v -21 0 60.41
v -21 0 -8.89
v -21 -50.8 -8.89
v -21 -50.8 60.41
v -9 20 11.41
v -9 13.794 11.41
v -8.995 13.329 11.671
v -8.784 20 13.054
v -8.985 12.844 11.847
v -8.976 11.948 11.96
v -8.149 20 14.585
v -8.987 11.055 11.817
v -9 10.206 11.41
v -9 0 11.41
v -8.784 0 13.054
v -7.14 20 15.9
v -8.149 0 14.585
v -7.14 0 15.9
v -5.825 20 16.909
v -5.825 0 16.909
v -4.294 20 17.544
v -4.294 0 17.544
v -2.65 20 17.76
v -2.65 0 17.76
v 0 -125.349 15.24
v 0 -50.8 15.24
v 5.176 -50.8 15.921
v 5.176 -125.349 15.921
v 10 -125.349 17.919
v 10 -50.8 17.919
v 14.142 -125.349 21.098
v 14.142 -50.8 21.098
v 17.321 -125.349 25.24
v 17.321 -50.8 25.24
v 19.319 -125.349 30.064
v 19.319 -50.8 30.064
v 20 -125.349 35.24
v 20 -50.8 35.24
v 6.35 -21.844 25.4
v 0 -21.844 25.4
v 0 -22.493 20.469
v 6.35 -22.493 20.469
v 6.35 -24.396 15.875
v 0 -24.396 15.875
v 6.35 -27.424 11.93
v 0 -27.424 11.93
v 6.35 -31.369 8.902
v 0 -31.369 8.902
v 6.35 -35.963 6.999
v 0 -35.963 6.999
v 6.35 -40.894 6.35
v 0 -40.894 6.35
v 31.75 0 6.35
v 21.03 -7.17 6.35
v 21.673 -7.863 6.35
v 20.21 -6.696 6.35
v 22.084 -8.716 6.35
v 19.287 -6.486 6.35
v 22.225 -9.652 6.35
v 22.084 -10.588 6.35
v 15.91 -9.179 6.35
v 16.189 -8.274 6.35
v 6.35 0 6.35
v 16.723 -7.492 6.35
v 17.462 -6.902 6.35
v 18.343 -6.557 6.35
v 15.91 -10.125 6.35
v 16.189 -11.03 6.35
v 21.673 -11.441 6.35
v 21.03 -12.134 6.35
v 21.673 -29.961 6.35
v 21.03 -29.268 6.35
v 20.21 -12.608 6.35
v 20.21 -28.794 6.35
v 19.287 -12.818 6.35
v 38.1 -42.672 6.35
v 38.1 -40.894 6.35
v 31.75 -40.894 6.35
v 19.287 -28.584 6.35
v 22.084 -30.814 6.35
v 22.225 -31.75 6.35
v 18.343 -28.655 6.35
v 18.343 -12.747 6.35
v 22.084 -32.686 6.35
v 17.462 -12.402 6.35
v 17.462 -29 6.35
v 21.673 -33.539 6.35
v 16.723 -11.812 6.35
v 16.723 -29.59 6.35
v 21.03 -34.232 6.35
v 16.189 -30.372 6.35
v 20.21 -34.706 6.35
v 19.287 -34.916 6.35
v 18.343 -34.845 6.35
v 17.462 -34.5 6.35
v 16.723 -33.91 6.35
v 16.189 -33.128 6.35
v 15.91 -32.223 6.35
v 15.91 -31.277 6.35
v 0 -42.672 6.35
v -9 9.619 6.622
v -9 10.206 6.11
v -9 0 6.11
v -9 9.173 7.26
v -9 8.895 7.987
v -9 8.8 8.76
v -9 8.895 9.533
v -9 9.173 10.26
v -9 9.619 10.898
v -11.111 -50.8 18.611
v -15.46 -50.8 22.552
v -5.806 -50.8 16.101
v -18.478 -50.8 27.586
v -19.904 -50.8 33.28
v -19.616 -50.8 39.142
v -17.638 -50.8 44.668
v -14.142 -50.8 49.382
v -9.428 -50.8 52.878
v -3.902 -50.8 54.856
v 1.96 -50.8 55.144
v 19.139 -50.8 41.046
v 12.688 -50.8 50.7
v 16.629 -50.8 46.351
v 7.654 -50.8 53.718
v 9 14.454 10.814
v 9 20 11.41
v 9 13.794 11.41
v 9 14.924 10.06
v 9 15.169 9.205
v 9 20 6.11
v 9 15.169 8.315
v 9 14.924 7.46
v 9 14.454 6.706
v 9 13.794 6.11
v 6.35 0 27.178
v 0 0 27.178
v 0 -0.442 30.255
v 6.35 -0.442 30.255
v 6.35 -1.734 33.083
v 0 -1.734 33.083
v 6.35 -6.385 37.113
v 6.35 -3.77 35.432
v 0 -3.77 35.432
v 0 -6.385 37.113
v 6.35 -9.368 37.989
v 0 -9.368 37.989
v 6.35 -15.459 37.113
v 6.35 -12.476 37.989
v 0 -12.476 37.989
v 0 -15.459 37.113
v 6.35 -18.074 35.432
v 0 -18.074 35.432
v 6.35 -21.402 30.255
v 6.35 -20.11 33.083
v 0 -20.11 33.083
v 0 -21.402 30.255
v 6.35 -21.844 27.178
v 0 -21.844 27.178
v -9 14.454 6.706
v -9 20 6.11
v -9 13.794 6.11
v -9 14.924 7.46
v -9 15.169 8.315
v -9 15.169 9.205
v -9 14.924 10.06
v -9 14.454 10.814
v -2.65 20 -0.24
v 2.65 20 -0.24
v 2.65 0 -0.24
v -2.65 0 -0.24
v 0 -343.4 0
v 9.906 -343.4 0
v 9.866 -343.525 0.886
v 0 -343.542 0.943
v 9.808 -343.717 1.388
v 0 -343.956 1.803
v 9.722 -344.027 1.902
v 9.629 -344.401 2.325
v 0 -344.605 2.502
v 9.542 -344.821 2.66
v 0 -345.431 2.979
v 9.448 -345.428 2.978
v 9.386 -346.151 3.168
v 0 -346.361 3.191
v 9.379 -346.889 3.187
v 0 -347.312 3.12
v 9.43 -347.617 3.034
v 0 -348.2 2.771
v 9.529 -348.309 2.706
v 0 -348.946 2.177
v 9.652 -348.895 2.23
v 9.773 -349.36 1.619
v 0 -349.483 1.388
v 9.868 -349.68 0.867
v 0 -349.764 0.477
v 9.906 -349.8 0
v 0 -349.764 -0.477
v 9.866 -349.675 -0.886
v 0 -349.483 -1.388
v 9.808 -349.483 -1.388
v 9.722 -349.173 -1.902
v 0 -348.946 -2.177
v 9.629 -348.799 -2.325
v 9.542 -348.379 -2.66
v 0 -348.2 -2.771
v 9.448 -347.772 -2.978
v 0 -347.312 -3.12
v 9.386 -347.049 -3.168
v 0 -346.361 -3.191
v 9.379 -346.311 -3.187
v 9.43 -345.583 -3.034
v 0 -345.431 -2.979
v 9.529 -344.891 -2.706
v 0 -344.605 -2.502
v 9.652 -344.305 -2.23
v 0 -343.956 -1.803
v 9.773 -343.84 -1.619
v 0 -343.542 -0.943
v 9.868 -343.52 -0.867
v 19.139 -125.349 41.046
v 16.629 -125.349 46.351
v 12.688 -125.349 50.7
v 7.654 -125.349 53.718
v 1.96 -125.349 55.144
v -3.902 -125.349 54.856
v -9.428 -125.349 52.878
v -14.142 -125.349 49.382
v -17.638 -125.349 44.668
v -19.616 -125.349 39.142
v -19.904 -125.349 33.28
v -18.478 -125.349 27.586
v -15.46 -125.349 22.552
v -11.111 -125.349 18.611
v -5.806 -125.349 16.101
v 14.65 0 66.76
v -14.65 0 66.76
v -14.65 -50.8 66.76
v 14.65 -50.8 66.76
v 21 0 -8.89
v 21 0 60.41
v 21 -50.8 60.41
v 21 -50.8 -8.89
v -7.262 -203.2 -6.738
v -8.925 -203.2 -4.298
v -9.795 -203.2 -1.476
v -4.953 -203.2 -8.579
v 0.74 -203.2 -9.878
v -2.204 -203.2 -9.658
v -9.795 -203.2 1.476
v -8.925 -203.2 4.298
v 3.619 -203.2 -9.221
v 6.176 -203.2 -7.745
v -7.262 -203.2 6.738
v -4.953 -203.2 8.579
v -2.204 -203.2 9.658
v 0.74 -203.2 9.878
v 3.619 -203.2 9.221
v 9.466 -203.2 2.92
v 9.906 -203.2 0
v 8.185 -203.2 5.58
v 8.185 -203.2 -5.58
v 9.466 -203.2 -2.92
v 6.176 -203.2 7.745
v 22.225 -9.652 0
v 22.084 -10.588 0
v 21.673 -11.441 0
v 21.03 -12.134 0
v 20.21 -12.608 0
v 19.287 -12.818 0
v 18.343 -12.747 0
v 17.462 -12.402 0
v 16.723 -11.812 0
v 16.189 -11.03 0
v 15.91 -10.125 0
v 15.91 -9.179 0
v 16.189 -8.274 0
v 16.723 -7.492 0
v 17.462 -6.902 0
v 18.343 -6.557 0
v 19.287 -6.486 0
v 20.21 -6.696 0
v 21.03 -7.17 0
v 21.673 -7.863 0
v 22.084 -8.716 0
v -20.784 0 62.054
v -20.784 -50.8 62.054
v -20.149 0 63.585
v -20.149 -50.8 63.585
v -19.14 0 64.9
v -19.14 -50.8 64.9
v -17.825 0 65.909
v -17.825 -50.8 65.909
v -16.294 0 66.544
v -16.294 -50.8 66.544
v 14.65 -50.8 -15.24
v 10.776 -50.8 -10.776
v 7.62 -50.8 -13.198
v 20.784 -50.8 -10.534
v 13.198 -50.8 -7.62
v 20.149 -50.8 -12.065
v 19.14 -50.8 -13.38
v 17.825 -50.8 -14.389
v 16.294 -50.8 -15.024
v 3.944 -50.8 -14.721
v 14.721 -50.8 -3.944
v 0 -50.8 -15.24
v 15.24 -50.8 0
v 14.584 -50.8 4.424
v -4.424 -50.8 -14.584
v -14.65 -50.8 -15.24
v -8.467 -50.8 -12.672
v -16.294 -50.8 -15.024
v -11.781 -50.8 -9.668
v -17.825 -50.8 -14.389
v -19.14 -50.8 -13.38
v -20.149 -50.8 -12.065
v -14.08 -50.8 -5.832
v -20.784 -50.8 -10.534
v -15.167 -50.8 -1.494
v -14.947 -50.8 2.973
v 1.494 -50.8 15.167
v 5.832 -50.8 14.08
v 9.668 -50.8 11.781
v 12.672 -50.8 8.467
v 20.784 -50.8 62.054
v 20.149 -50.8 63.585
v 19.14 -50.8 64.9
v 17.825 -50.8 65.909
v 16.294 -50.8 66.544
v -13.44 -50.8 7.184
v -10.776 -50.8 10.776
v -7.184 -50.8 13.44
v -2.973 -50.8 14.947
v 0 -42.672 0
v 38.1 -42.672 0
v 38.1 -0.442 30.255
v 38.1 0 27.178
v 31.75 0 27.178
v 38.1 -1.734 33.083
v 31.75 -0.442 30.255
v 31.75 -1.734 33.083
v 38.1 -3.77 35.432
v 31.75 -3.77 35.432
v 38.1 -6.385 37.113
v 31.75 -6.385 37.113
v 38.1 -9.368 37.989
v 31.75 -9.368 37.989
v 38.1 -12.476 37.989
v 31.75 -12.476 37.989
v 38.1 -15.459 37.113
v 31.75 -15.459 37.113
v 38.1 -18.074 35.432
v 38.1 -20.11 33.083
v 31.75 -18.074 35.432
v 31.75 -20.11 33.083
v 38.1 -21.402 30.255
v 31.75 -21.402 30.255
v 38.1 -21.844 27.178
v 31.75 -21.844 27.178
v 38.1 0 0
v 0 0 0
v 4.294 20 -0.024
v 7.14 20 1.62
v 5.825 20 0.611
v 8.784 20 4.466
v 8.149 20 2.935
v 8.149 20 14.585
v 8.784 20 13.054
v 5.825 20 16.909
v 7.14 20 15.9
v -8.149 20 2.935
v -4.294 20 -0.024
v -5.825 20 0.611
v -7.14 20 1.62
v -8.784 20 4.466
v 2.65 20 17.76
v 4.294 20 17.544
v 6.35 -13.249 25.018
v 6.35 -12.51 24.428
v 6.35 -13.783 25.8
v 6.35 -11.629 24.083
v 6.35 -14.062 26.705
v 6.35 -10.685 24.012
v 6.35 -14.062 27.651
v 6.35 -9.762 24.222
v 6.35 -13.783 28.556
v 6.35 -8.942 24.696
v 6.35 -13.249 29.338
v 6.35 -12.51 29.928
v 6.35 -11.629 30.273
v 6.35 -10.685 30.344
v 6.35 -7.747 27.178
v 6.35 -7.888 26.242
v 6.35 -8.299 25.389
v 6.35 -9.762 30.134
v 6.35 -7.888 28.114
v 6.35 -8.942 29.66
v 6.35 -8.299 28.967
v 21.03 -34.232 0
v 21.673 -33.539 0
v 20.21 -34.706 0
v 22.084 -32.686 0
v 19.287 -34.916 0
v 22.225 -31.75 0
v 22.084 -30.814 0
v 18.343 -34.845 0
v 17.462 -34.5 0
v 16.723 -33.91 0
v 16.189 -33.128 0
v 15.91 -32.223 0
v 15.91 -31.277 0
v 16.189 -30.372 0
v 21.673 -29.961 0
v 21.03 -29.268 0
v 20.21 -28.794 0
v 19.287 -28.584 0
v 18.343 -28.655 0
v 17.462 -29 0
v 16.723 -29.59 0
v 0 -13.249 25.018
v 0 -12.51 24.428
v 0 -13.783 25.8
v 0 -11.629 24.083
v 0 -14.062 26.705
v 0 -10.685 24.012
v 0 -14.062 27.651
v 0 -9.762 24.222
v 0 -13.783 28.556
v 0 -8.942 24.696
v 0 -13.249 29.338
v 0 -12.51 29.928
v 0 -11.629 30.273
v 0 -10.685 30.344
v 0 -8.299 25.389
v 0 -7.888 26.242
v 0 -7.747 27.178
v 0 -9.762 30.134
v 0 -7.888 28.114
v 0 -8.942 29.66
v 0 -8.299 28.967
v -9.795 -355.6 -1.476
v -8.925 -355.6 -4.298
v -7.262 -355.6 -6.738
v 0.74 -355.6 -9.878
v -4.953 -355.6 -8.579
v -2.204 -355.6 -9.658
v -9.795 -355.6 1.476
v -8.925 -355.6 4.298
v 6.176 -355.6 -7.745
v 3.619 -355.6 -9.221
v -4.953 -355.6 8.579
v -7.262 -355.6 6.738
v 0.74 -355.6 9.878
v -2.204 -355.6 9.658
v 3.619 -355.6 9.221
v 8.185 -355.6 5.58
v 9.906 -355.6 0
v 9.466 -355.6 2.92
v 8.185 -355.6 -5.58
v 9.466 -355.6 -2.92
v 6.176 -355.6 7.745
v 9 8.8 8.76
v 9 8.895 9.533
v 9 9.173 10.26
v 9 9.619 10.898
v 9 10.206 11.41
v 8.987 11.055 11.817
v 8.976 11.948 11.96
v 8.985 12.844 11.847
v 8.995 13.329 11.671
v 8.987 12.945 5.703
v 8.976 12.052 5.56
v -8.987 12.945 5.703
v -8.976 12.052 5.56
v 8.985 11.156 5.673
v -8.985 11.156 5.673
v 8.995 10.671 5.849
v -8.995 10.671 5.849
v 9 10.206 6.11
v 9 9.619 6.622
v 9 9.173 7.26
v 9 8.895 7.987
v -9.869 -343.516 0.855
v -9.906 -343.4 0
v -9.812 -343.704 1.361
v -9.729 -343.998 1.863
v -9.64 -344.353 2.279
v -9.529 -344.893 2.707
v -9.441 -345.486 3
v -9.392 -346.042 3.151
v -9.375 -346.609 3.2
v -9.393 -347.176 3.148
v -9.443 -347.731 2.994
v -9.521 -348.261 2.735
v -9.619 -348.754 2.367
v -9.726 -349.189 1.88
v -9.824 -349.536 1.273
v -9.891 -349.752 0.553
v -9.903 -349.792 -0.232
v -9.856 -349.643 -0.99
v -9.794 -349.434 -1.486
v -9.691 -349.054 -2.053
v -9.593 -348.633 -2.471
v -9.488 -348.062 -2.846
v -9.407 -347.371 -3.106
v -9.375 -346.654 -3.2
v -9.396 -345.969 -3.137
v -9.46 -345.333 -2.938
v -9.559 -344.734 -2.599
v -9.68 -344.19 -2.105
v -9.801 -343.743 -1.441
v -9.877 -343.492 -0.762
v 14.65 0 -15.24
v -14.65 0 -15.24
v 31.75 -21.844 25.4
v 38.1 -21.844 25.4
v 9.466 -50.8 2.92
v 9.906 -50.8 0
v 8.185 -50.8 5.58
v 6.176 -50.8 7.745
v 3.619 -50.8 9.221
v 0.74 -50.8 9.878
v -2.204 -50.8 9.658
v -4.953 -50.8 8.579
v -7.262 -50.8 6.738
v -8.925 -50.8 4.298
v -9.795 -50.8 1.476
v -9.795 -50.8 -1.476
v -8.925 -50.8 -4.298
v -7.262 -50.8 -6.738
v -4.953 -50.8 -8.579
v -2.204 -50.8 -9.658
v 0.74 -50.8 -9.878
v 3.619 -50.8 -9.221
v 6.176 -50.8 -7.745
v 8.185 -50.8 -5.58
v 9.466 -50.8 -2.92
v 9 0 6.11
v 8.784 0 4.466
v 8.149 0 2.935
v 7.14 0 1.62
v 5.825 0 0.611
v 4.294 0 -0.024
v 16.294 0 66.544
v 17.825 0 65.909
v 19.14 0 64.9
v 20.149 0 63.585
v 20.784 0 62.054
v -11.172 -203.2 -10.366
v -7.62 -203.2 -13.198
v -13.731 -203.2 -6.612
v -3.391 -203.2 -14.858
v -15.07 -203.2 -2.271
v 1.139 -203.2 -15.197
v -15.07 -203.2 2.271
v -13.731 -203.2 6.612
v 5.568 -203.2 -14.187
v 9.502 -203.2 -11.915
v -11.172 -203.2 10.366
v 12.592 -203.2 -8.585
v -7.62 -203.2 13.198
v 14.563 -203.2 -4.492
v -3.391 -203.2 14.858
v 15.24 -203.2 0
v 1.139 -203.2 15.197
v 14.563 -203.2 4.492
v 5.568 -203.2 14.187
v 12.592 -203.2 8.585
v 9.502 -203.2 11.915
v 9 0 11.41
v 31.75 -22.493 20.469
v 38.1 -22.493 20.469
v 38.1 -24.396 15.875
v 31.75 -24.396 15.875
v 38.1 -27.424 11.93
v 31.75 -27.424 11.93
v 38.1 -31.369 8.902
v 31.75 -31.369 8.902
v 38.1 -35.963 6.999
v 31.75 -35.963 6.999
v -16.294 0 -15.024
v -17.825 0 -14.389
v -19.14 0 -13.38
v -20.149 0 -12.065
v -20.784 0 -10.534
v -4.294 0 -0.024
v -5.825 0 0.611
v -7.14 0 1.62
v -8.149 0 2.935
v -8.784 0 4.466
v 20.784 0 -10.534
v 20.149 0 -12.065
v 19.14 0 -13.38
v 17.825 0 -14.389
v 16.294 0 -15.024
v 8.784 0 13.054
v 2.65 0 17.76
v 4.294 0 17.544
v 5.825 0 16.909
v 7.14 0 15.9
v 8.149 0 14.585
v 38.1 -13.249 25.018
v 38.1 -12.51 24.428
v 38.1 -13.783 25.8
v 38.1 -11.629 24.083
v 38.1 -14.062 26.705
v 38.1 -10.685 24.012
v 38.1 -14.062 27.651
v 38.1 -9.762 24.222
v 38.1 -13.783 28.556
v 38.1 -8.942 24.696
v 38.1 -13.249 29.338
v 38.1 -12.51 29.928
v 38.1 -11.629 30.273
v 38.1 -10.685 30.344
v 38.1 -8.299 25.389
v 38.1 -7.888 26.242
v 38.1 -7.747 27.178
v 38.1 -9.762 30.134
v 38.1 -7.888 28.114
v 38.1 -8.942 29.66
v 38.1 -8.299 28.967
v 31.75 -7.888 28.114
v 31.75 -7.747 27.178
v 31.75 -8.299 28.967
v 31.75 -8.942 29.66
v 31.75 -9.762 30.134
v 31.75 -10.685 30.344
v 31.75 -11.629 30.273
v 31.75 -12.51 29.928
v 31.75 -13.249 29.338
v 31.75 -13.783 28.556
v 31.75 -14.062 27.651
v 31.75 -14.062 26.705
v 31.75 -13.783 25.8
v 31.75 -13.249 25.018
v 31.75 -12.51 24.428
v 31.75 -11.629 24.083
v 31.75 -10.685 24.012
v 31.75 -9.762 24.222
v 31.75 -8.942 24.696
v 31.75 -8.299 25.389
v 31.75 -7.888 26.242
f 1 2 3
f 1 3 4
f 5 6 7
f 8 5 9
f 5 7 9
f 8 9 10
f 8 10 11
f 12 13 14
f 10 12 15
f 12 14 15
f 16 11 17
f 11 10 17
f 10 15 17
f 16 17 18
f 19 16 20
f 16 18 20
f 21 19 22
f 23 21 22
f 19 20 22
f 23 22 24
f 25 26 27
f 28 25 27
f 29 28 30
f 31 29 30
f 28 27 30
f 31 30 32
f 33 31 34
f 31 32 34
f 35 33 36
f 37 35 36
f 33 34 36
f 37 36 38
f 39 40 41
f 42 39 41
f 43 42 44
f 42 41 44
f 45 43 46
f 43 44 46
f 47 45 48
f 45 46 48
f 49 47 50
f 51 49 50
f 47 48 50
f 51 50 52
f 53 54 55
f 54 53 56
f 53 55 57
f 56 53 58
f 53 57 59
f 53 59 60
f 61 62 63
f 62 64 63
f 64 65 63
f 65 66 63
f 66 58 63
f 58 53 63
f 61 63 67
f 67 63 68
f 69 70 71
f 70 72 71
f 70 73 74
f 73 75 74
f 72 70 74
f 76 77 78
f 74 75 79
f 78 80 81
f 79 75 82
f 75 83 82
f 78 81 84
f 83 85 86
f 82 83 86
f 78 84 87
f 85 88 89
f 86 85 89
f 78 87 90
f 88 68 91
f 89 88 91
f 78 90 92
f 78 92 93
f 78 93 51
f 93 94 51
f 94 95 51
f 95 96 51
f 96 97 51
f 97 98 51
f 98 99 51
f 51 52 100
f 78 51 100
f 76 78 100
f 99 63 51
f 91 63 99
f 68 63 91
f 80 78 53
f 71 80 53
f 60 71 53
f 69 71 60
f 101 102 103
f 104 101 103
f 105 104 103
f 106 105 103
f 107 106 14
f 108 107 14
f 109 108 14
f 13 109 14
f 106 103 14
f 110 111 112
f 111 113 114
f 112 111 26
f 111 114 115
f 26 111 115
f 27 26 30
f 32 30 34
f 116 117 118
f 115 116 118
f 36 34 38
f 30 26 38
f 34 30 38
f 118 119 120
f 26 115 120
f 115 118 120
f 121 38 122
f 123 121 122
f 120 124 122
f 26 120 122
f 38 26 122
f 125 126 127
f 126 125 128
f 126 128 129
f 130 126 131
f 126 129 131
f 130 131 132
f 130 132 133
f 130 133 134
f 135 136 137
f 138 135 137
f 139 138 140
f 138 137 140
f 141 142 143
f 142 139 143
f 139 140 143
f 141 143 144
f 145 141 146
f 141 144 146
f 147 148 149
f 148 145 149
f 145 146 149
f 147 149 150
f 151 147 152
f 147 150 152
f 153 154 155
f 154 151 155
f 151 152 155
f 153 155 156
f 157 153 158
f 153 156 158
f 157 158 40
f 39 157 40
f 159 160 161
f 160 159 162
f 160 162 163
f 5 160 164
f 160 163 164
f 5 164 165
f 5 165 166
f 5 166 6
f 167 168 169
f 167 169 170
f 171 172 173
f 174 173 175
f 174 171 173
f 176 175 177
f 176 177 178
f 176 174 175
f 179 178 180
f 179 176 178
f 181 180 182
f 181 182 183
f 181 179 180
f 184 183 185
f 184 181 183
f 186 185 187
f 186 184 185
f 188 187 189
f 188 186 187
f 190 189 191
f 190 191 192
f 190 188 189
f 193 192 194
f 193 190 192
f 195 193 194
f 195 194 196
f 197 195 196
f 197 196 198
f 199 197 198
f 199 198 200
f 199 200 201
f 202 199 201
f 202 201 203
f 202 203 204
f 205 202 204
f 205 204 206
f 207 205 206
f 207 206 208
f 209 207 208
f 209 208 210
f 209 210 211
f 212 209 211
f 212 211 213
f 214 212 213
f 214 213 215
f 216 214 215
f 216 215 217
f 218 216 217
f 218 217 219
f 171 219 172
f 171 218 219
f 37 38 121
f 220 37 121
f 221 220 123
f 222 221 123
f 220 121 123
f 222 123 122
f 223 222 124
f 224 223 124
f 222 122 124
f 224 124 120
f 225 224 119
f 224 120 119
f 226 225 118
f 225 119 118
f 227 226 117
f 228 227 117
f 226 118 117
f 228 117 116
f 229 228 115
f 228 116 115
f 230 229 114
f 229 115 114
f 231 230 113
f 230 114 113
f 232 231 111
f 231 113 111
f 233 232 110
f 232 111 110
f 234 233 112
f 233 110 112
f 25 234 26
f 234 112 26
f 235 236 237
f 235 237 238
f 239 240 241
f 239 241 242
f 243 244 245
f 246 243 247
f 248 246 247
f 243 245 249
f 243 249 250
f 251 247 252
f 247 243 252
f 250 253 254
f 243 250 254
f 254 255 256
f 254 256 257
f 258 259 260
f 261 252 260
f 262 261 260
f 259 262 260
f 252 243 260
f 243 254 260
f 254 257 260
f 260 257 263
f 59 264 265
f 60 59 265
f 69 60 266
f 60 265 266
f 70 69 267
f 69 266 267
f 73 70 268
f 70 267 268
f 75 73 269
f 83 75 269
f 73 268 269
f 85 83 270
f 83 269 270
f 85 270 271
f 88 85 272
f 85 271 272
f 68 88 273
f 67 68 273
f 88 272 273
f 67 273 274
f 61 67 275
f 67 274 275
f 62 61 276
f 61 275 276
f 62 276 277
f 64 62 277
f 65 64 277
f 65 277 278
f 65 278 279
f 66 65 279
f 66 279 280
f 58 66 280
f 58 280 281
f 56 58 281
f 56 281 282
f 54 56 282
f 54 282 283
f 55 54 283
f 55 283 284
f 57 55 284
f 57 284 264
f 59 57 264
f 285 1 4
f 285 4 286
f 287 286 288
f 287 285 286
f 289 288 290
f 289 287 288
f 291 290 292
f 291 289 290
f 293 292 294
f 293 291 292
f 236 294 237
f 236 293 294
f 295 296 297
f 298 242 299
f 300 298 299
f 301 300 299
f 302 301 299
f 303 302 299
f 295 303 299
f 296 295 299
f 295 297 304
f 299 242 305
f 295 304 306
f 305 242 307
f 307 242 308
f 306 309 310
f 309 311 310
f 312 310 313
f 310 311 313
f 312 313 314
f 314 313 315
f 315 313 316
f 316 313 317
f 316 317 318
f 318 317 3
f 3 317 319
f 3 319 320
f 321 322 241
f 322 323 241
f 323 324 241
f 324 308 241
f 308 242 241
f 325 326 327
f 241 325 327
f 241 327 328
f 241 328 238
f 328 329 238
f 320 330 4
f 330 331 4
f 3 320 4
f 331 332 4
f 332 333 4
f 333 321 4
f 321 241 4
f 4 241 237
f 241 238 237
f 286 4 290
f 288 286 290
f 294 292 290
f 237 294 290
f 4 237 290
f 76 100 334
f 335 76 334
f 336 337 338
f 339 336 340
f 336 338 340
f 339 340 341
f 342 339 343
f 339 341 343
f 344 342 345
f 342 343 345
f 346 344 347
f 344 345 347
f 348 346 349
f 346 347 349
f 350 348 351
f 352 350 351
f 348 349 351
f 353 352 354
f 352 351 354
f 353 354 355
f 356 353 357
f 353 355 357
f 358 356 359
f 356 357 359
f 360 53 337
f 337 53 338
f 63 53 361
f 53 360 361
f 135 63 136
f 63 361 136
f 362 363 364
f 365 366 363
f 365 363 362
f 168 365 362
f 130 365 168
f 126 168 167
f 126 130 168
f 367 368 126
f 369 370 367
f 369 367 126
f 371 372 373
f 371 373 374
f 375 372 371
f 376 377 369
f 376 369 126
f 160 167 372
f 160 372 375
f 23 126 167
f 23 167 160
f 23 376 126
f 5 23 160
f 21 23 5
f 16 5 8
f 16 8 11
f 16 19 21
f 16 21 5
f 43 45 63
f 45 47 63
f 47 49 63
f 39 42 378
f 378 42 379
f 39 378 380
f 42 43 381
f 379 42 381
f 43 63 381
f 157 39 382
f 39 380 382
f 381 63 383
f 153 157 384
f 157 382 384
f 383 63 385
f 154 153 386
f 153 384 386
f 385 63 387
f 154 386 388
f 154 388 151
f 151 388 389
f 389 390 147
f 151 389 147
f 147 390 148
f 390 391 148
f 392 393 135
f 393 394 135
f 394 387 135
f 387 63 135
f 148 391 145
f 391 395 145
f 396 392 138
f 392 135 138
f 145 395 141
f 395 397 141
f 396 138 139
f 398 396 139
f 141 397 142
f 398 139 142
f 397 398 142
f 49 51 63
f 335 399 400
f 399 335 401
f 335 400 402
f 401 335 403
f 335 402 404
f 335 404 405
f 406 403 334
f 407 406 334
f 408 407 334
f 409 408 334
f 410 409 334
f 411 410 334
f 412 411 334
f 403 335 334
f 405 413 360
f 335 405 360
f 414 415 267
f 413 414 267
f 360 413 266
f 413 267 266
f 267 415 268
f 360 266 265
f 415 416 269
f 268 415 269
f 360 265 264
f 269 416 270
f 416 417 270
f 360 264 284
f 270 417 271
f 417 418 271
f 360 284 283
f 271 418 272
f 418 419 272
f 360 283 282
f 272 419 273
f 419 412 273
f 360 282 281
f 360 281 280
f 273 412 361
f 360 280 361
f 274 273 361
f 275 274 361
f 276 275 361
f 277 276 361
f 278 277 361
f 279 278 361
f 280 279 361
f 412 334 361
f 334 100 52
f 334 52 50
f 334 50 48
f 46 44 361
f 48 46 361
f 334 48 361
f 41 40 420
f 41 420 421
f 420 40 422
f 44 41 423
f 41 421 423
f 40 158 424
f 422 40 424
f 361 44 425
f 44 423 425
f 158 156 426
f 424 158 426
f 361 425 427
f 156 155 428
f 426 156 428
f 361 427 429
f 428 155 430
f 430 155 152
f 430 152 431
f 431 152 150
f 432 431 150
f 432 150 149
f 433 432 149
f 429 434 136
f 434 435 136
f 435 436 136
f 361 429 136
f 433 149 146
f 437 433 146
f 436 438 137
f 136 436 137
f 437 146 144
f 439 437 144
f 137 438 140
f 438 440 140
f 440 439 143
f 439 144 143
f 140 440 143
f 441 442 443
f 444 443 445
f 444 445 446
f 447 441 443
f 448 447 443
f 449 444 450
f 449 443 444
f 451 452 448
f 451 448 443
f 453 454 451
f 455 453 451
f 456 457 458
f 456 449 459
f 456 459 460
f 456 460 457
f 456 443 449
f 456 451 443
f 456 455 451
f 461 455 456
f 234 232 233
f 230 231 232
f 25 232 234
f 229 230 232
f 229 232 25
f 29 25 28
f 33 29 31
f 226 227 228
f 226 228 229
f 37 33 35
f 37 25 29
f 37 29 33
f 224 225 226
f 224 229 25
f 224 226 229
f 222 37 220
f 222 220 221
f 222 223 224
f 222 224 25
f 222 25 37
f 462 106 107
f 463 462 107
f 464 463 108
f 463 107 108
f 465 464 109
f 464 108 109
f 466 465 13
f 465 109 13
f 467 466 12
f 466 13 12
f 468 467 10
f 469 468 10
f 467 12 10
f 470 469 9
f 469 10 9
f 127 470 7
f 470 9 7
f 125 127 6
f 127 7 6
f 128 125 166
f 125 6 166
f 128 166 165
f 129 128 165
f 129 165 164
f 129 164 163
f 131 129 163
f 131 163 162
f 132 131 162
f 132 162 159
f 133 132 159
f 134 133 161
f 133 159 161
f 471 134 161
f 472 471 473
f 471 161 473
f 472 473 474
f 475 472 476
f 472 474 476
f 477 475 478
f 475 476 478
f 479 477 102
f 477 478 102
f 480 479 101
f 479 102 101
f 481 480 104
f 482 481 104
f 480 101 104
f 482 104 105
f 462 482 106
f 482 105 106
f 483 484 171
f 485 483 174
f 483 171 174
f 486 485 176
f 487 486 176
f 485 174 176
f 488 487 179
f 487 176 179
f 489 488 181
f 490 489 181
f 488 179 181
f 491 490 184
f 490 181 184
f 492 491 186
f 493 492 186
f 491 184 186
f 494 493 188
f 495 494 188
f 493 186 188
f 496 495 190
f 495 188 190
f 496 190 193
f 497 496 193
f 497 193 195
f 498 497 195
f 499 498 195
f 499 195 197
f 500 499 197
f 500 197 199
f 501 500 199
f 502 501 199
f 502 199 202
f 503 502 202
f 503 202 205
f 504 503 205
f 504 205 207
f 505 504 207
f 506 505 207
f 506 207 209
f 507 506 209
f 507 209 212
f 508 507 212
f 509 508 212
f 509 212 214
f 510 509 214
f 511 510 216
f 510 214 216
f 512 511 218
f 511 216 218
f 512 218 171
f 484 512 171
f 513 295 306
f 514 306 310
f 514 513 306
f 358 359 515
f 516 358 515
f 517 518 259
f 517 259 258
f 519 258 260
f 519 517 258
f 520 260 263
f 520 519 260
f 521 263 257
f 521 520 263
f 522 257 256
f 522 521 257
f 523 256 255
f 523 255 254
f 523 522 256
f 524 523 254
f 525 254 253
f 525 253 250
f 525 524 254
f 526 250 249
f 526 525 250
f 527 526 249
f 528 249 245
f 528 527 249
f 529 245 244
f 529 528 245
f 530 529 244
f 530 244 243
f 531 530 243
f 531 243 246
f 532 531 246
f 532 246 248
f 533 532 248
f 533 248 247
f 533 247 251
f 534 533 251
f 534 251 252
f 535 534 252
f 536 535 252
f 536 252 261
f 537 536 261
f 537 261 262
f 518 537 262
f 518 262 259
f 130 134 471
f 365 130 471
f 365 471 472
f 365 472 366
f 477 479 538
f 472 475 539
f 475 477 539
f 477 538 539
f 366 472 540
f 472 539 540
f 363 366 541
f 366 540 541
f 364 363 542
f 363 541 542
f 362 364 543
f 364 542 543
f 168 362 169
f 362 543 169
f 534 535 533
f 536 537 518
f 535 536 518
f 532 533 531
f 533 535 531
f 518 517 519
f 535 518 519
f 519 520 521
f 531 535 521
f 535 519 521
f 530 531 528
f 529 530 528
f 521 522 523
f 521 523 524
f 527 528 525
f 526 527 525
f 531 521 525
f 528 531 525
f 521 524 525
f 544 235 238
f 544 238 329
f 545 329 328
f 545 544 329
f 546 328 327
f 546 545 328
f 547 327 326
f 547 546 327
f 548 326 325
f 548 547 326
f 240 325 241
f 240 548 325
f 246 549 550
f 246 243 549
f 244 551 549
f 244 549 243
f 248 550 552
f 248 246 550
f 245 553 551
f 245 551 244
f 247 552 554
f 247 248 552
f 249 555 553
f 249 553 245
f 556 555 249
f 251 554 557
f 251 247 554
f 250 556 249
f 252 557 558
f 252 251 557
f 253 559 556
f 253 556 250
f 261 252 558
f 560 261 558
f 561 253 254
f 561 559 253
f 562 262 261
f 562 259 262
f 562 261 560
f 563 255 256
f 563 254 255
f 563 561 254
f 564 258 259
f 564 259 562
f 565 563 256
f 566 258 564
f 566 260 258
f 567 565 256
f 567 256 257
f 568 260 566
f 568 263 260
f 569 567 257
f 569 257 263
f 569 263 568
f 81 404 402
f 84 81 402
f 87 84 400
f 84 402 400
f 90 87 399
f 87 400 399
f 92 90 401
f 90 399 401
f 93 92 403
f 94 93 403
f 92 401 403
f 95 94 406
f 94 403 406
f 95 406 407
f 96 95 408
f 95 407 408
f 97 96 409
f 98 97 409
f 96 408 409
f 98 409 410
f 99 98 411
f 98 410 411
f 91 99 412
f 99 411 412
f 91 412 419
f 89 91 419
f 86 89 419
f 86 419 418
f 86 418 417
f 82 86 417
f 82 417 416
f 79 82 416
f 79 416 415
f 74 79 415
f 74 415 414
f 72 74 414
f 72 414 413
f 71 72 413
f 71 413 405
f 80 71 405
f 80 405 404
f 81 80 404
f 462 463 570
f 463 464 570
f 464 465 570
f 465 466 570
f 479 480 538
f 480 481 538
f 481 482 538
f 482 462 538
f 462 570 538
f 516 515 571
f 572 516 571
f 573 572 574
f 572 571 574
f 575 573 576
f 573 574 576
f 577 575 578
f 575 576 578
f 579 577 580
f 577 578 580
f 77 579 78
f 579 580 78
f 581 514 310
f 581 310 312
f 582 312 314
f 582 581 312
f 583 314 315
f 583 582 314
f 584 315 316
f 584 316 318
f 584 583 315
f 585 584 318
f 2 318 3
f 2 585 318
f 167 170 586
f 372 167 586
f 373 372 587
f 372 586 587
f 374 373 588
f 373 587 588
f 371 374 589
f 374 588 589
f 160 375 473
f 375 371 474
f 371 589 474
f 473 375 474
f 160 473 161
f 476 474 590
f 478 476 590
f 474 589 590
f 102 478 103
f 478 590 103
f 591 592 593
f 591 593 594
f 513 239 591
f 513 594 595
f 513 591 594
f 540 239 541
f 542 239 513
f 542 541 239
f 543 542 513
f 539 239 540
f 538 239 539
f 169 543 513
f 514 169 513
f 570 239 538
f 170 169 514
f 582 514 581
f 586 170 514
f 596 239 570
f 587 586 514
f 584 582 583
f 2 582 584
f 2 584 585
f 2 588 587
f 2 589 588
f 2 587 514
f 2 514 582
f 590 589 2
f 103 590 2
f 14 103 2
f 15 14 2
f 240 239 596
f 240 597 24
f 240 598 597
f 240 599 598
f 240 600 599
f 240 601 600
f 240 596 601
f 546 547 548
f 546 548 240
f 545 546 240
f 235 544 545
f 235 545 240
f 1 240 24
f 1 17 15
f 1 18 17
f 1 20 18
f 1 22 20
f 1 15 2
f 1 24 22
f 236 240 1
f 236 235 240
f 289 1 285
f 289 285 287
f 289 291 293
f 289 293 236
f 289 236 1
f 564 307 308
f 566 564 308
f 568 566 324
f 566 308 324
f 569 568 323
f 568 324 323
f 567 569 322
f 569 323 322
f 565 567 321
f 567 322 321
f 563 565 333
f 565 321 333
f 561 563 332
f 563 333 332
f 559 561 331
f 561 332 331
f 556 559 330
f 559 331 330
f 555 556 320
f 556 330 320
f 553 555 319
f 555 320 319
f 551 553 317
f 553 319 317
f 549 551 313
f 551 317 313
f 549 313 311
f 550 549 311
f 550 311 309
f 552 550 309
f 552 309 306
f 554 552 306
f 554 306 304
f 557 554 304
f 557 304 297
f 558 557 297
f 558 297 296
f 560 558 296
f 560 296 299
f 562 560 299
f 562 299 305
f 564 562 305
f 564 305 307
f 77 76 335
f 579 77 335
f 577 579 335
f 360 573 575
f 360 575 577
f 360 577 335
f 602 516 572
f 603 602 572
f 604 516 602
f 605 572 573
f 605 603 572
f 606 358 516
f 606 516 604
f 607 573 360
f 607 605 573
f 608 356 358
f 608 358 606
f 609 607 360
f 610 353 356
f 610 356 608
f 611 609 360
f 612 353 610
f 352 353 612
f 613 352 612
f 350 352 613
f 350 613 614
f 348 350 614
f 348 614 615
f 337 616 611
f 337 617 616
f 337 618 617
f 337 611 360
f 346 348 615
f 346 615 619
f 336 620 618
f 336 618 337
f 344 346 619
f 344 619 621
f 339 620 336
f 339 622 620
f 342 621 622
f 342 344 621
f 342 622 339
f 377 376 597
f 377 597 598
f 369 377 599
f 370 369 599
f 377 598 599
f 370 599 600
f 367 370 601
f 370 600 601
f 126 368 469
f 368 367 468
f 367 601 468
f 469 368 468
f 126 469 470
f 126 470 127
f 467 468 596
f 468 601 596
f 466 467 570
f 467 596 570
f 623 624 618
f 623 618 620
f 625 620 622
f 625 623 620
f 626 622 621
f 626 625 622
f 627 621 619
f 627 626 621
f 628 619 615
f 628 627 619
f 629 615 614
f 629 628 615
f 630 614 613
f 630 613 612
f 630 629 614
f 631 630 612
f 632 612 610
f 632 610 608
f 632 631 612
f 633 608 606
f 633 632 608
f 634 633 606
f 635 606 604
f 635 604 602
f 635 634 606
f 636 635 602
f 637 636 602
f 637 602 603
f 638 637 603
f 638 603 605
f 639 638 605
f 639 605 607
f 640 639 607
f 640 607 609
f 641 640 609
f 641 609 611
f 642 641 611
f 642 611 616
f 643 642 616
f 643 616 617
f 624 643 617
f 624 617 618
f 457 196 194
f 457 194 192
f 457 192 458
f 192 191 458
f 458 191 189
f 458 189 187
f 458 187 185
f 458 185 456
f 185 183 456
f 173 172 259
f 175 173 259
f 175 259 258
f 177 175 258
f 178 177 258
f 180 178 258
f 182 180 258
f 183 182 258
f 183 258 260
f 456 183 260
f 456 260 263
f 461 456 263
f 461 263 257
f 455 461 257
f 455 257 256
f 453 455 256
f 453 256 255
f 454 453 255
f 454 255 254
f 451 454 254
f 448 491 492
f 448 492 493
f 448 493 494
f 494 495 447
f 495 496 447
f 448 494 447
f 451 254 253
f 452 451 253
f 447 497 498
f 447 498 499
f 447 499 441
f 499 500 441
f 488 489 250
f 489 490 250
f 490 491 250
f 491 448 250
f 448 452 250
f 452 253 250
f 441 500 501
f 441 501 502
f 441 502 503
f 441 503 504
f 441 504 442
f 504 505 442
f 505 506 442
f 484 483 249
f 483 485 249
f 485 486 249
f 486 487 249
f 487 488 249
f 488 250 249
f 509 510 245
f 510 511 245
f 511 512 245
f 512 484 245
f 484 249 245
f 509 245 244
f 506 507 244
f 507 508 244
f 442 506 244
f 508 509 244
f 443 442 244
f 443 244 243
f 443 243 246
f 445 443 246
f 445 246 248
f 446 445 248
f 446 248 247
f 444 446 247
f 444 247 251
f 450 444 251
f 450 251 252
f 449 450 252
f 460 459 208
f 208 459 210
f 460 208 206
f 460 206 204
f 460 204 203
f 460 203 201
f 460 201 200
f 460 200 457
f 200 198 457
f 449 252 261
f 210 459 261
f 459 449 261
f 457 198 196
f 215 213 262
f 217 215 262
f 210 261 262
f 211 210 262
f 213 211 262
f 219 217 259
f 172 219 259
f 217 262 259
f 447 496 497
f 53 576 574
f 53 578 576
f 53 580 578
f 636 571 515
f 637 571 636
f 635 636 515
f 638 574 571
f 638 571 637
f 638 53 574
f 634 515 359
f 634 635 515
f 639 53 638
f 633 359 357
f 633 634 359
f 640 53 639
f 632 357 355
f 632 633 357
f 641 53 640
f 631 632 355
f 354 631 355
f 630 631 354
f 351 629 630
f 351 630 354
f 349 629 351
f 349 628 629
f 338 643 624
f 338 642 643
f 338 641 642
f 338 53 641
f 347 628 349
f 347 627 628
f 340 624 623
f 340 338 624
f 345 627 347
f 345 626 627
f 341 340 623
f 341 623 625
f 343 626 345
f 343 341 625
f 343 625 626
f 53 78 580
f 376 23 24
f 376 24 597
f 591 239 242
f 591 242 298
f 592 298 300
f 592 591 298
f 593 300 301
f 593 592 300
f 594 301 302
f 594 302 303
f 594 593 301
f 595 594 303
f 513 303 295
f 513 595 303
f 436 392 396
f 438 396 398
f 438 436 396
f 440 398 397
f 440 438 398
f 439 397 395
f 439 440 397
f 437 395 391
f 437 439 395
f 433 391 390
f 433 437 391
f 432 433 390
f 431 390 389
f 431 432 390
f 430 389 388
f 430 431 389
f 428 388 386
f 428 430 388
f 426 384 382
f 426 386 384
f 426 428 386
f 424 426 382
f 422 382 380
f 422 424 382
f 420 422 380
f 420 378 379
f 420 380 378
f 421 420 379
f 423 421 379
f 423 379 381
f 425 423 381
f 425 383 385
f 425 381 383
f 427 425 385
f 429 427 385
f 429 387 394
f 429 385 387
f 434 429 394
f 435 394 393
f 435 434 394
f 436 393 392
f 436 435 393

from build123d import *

# Parameters (mm, degrees)
F0_R           = 15.24
F0_R_2         = 9.906
F1_DEPTH       = 203.2
F3_DEPTH       = 50.8
F5_DEPTH       = 20
F6_R           = 9.906
F7_DEPTH       = 152.4
F9_DEPTH       = 74.549
F11_R          = 3.2
F12_DEPTH      = 21.001
F12_DEPTH_BACK = 21.001
F13_R          = 3.2
F14_DEPTH      = 30.001
F15_R          = 3.175
F16_DEPTH      = 38.1
F17_W          = 25.4
F17_H          = 31.75
F18_DEPTH      = 355.6010001
F19_R          = 3.175
F20_DEPTH      = 66.761


with BuildPart() as f1:
    # F0 (on Front) → F1 (new body)
    with BuildSketch(Plane.XZ):
        Circle(F0_R)
        Circle(F0_R_2, mode=Mode.SUBTRACT)
    extrude(amount=F1_DEPTH)

    # F2 (on face) → F3 (join)
    with BuildSketch(Plane(origin=(0, 0, 0), x_dir=(-1, 0, 0), z_dir=(0, 1, 0))):
        with BuildLine():
            Line((14.65, 66.76), (-14.65, 66.76))
            ThreePointArc((-14.65, 66.76), (-19.1401280605, 64.9001280605), (-21, 60.41))
            Line((-21, 60.41), (-21, -8.89))
            ThreePointArc((-21, -8.89), (-19.1401280605, -13.3801280605), (-14.65, -15.24))
            Line((-14.65, -15.24), (14.65, -15.24))
            ThreePointArc((14.65, -15.24), (19.1401280605, -13.3801280605), (21, -8.89))
            Line((21, -8.89), (21, 60.41))
            ThreePointArc((21, 60.41), (19.1401280605, 64.9001280605), (14.65, 66.76))
        make_face()
    extrude(amount=-F3_DEPTH)

    # F4 (on face) → F5 (join)
    with BuildSketch(Plane(origin=(0, 0, 0), x_dir=(-1, 0, 0), z_dir=(0, 1, 0))):
        with BuildLine():
            Line((2.65, 17.76), (-2.65, 17.76))
            ThreePointArc((-2.65, 17.76), (-7.1401280605, 15.9001280605), (-9, 11.41))
            Line((-9, 11.41), (-9, 6.11))
            ThreePointArc((-9, 6.11), (-7.1401280605, 1.6198719395), (-2.65, -0.24))
            Line((-2.65, -0.24), (2.65, -0.24))
            ThreePointArc((2.65, -0.24), (7.1401280605, 1.6198719395), (9, 6.11))
            Line((9, 6.11), (9, 11.41))
            ThreePointArc((9, 11.41), (7.1401280605, 15.9001280605), (2.65, 17.76))
        make_face()
    extrude(amount=F5_DEPTH)

    # F13 (on face) → F14 (cut, through all)
    with BuildSketch(Plane(origin=(-9, 0, 0), x_dir=(0, -1, 0), z_dir=(-1, 0, 0))):
        with Locations((-12, 8.76)):
            Circle(F13_R)
    extrude(amount=-F14_DEPTH, mode=Mode.SUBTRACT)


with BuildPart() as f7:
    # F6 (on face) → F7 (new body)
    with BuildSketch(Plane.XZ.offset(203.2)):
        Circle(F6_R)
    extrude(amount=F7_DEPTH)

    # F11 (on face) → F12 (cut, two sides)
    with BuildSketch(Plane.YZ) as f12_sk:
        with Locations((-346.6, 0)):
            Circle(F11_R)
    extrude(amount=-F12_DEPTH, mode=Mode.SUBTRACT)
    extrude(f12_sk.sketch, amount=F12_DEPTH_BACK, mode=Mode.SUBTRACT)


with BuildPart() as f9:
    # F8 (on face) → F9 (new body)
    with BuildSketch(Plane.XZ.offset(50.8)):
        with BuildLine():
            ThreePointArc((-3.43e-08, 15.24), (14.1421356116, 21.0978643641), (20, 35.24))
            ThreePointArc((20, 35.24), (-14.1421356116, 49.3821356359), (-3.43e-08, 15.24))
        make_face()
    extrude(amount=F9_DEPTH)


with BuildPart() as f16:
    # F15 (on Right) → F16 (new body)
    with BuildSketch(Plane.YZ):
        with BuildLine():
            Line((-42.672, 0), (0, 0))
            Line((0, 0), (0, 27.178))
            ThreePointArc((0, 27.178), (-10.922, 38.1), (-21.844, 27.178))
            Line((-21.844, 27.178), (-21.844, 25.4))
            ThreePointArc((-21.844, 25.4), (-27.4236158184, 11.9296158184), (-40.894, 6.35))
            Line((-40.894, 6.35), (-42.672, 6.35))
            Line((-42.672, 6.35), (-42.672, 0))
        make_face()
        with Locations((-10.922, 27.178)):
            Circle(F15_R, mode=Mode.SUBTRACT)
    extrude(amount=F16_DEPTH)

    # F17 (on face) → F18 (cut, through all)
    with BuildSketch(Plane(origin=(0, 0, 0), x_dir=(-1, 0, 0), z_dir=(0, 1, 0))):
        with Locations((-19.05, 22.225)):
            Rectangle(F17_W, F17_H)
    extrude(amount=-F18_DEPTH, mode=Mode.SUBTRACT)

    # F19 (on face) → F20 (cut, through all)
    with BuildSketch(Plane(origin=(0, 0, 0), x_dir=(1, 0, 0), z_dir=(0, 0, -1))):
        with Locations((19.05, 9.652)):
            Circle(F19_R)
        with Locations((19.05, 31.75)):
            Circle(F19_R)
    extrude(amount=-F20_DEPTH, mode=Mode.SUBTRACT)


solid = Compound([f1.part, f7.part, f9.part, f16.part])
